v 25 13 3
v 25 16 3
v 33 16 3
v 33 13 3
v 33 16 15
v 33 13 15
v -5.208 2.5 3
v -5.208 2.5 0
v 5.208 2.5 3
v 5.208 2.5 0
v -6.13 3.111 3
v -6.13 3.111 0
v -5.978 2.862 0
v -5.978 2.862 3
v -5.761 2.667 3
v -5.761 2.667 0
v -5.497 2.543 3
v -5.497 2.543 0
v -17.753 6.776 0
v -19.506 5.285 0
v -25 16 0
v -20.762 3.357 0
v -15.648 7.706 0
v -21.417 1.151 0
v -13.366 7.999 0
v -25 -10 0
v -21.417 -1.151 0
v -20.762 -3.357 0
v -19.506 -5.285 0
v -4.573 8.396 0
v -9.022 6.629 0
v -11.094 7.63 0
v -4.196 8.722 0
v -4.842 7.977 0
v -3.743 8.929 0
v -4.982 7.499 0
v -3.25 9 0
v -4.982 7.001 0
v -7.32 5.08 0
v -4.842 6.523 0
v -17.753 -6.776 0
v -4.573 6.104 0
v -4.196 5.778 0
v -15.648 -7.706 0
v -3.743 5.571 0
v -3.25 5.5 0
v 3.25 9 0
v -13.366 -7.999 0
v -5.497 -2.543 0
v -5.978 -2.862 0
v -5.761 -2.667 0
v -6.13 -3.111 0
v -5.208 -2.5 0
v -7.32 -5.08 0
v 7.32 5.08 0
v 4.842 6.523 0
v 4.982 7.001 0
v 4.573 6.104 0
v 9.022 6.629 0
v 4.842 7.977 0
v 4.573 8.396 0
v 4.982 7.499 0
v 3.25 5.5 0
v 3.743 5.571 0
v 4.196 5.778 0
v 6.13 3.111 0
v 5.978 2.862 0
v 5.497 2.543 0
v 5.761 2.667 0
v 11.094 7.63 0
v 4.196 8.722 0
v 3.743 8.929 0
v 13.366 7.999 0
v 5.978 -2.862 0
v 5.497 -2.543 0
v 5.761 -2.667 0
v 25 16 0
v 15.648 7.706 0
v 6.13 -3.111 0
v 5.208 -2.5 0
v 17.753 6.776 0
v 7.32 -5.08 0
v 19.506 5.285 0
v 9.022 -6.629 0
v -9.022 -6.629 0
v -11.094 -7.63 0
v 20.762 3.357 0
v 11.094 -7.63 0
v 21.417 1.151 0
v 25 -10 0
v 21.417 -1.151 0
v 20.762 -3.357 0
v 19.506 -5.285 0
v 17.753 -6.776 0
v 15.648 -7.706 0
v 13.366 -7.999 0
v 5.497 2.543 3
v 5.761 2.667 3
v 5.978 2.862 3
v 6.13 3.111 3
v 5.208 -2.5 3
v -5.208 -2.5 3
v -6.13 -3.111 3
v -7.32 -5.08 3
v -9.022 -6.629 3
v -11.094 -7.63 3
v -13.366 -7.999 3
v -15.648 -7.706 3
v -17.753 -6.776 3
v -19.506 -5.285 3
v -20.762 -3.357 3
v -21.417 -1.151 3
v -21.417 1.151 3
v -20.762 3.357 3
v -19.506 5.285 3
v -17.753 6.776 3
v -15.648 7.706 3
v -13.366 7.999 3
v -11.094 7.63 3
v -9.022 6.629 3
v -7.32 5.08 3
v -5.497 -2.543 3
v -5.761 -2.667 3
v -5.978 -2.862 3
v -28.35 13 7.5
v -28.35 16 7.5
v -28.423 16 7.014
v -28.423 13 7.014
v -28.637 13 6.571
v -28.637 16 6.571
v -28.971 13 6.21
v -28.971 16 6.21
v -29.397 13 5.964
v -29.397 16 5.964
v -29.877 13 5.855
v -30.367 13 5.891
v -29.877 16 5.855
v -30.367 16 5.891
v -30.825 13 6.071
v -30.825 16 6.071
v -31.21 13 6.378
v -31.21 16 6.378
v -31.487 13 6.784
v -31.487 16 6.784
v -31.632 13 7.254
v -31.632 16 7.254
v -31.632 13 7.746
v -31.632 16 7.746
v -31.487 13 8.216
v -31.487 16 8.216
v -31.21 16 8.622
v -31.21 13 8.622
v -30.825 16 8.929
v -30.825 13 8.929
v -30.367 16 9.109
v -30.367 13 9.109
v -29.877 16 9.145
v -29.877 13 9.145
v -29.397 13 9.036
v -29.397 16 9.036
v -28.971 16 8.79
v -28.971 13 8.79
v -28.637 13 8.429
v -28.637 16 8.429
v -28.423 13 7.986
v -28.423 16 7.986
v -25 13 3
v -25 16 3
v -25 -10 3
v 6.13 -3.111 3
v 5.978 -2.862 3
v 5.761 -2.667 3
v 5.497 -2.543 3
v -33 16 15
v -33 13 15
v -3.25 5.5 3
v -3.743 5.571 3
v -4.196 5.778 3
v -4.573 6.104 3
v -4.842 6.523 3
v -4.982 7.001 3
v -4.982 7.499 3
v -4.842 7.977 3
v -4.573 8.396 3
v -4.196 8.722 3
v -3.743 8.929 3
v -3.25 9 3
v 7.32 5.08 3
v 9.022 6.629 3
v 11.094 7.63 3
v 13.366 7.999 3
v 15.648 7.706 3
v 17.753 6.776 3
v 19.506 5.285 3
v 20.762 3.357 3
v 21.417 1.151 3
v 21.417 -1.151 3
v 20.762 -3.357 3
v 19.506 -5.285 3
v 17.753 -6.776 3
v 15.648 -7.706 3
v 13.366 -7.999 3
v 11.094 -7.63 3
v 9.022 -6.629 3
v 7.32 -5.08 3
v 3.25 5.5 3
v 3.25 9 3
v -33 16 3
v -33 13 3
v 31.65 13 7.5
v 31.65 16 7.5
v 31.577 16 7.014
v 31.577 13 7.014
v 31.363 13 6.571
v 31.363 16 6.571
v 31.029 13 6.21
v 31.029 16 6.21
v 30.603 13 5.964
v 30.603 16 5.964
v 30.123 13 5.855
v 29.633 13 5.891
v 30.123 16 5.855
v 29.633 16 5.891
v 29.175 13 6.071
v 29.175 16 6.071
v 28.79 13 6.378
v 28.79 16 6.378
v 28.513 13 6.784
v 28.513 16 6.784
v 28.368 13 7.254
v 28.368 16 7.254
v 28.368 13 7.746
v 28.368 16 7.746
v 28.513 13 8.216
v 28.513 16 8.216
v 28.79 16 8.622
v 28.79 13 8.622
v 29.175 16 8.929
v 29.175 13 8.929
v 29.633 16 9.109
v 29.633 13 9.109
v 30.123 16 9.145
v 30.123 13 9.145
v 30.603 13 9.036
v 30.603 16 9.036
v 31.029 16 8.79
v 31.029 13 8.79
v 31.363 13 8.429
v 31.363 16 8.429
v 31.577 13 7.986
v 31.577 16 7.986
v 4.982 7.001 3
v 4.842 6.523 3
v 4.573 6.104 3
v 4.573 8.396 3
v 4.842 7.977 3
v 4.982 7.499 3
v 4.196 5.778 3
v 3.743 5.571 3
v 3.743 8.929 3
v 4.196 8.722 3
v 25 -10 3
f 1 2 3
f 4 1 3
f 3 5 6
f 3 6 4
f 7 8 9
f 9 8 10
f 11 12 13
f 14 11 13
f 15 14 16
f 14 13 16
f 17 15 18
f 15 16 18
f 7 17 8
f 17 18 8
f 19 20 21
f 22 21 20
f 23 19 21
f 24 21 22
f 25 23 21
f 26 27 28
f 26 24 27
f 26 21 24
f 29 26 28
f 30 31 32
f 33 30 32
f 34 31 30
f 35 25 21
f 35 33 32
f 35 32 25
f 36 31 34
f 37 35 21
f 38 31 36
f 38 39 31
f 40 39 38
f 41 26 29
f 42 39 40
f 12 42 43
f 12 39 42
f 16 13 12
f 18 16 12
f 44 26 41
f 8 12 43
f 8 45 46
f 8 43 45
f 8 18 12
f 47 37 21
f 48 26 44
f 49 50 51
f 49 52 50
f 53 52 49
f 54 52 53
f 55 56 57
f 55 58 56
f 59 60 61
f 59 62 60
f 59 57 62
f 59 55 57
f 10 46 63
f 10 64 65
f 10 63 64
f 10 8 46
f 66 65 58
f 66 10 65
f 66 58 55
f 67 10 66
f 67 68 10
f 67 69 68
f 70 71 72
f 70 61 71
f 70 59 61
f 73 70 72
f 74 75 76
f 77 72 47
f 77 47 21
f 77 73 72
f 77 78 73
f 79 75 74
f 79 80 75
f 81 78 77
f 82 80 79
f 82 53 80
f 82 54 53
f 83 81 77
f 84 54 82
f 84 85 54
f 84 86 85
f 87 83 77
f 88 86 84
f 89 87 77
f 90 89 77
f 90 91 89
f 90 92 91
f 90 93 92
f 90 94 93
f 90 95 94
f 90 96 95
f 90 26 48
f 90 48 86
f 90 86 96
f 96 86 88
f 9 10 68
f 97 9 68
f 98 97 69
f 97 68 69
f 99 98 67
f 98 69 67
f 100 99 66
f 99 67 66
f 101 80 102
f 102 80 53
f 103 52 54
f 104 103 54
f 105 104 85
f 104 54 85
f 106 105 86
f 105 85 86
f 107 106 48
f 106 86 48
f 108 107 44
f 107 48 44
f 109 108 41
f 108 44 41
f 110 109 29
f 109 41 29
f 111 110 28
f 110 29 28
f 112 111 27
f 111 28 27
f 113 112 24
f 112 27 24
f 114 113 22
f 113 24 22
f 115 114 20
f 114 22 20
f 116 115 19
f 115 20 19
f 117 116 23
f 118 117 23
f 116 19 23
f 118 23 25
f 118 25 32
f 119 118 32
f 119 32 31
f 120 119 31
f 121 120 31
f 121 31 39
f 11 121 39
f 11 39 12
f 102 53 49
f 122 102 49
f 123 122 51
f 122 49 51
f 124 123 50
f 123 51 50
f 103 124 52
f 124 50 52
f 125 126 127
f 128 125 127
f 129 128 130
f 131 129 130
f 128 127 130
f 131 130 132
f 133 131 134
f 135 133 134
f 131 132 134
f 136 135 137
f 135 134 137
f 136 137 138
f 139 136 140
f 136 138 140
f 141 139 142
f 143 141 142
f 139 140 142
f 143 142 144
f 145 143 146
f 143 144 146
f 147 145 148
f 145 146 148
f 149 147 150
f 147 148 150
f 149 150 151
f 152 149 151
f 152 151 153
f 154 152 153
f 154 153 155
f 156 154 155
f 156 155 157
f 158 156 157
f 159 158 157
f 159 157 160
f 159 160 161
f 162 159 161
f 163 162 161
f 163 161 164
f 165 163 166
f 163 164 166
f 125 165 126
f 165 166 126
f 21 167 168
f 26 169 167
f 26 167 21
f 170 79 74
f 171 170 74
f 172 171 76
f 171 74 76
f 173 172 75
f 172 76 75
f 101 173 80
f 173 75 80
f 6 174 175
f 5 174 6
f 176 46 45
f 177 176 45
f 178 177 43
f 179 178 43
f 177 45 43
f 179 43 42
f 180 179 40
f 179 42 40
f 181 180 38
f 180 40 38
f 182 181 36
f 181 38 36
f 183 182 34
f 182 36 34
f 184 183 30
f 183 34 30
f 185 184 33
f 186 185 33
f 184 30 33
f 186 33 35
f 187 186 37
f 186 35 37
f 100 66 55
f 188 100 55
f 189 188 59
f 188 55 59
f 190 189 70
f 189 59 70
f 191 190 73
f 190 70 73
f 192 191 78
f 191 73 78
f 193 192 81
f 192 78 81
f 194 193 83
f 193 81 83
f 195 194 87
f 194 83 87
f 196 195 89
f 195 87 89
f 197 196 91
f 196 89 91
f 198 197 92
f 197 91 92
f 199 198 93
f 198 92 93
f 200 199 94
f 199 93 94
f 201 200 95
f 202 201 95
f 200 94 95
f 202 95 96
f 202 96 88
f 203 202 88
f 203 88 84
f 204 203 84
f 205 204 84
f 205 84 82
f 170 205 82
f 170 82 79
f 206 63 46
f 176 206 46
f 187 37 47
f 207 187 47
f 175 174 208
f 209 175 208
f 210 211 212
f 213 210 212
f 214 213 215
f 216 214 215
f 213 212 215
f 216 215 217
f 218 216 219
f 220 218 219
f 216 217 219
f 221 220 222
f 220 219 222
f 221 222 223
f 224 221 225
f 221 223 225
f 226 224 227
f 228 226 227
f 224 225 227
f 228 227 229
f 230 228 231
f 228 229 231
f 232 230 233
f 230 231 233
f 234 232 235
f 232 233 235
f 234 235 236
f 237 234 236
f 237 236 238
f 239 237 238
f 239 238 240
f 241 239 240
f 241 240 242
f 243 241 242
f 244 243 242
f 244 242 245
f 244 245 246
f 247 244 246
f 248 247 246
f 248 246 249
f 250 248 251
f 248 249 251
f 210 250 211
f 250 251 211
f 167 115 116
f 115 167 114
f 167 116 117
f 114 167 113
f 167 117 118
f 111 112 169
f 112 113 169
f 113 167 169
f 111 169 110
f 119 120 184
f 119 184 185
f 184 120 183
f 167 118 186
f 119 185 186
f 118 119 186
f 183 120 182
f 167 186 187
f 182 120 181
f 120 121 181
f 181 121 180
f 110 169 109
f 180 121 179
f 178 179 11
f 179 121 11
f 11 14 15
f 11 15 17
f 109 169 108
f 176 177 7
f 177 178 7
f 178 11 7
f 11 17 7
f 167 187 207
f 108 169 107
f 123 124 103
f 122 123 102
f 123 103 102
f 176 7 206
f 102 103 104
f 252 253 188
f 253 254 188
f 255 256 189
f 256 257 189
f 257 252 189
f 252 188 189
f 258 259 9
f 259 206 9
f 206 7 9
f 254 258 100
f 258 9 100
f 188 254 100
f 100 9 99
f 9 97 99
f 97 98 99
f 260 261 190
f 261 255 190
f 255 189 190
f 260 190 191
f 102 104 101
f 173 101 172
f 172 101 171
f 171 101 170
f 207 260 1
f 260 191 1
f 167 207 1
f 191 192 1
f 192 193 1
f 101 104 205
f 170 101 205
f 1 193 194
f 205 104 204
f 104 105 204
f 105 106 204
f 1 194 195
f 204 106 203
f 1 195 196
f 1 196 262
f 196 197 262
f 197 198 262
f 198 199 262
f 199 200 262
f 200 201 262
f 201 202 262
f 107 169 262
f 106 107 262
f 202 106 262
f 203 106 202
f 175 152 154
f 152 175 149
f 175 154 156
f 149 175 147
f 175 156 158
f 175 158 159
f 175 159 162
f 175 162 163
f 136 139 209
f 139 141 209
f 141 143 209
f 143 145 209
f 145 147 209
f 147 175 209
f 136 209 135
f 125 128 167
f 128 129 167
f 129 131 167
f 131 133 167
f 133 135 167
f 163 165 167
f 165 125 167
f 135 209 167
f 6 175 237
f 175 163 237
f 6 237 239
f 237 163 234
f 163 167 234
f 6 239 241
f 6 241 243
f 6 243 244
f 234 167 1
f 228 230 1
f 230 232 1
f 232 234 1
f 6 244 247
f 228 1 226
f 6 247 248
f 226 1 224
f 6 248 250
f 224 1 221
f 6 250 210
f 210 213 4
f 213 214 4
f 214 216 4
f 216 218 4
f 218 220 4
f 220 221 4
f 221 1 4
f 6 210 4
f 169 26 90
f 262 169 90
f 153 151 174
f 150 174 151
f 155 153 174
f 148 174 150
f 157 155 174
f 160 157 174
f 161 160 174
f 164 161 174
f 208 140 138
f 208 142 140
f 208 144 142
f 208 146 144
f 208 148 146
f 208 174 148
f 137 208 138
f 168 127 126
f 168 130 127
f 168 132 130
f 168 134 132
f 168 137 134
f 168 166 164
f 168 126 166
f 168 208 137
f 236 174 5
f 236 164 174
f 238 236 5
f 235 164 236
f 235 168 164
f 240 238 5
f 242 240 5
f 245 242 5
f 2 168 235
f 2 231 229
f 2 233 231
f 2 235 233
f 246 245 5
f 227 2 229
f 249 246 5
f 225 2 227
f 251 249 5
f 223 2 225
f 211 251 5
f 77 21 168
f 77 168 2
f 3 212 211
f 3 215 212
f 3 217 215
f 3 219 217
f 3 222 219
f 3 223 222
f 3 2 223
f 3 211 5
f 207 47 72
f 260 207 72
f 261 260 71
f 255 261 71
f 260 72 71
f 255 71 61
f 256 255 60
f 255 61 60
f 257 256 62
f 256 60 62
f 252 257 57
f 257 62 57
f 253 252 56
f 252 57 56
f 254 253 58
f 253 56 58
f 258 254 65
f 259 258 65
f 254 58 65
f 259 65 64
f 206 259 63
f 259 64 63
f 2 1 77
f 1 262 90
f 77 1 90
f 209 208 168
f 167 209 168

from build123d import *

# Parameters (mm, degrees)
SKETCH_1_W          = 50
SKETCH_1_H          = 20
EXTRUDE_1_DEPTH     = 3
SKETCH_2_W          = 50
SKETCH_2_H          = 15
EXTRUDE_2_DEPTH     = 6
SKETCH_5_W          = 50
SKETCH_5_H          = 12
CUT_EXTRUDE_2_DEPTH = 3
SKETCH_6_W          = 8
SKETCH_6_H          = 12
SKETCH_6_R          = 1.65
EXTRUDE_3_DEPTH     = 3


with BuildPart() as part:
    # 草图1 → 凸台-拉伸1 (new body)
    with BuildSketch(Plane.XY):
        Rectangle(SKETCH_1_W, SKETCH_1_H)
        with BuildLine():
            Line((-5.208438024, 2.5), (5.208438024, 2.5))
            ThreePointArc((5.208438024, 2.5), (5.761208823, 2.666666667), (6.129722688, 3.111111111))
            ThreePointArc((6.129722688, 3.111111111), (21.5, 0), (6.129722688, -3.111111111))
            ThreePointArc((6.129722688, -3.111111111), (5.761208823, -2.666666667), (5.208438024, -2.5))
            Line((5.208438024, -2.5), (-5.208438024, -2.5))
            ThreePointArc((-5.208438024, -2.5), (-5.761208823, -2.666666667), (-6.129722688, -3.111111111))
            ThreePointArc((-6.129722688, -3.111111111), (-21.5, 0), (-6.129722688, 3.111111111))
            ThreePointArc((-6.129722688, 3.111111111), (-5.761208823, 2.666666667), (-5.208438024, 2.5))
        make_face(mode=Mode.SUBTRACT)
        with BuildLine():
            Line((3.25, 5.5), (-3.25, 5.5))
            ThreePointArc((-3.25, 5.5), (-5, 7.25), (-3.25, 9))
            Line((-3.25, 9), (3.25, 9))
            ThreePointArc((3.25, 9), (5, 7.25), (3.25, 5.5))
        make_face(mode=Mode.SUBTRACT)
    extrude(amount=EXTRUDE_1_DEPTH)

    # 草图2 → 凸台-拉伸2 (add)
    with BuildSketch(Plane(origin=(0, 10, 0), x_dir=(1, 0, 0), z_dir=(0, 1, 0))):
        with Locations((0, -7.5)):
            Rectangle(SKETCH_2_W, SKETCH_2_H)
    extrude(amount=EXTRUDE_2_DEPTH)

    # 草图5 → 切除-拉伸2 (cut)
    with BuildSketch(Plane.XZ.offset(-10)):
        with Locations((0, 9)):
            Rectangle(SKETCH_5_W, SKETCH_5_H)
    extrude(amount=-CUT_EXTRUDE_2_DEPTH, mode=Mode.SUBTRACT)

    # 草图6 → 凸台-拉伸3 (add)
    with BuildSketch(Plane(origin=(0, 16, 0), x_dir=(1, 0, 0), z_dir=(0, 1, 0))):
        with Locations((29, -9)):
            Rectangle(SKETCH_6_W, SKETCH_6_H)
        with Locations((30, -7.5)):
            Circle(SKETCH_6_R, mode=Mode.SUBTRACT)
        with Locations((-29, -9)):
            Rectangle(SKETCH_6_W, SKETCH_6_H)
        with Locations((-30, -7.5)):
            Circle(SKETCH_6_R, mode=Mode.SUBTRACT)
    extrude(amount=-EXTRUDE_3_DEPTH)


solid = part.part
